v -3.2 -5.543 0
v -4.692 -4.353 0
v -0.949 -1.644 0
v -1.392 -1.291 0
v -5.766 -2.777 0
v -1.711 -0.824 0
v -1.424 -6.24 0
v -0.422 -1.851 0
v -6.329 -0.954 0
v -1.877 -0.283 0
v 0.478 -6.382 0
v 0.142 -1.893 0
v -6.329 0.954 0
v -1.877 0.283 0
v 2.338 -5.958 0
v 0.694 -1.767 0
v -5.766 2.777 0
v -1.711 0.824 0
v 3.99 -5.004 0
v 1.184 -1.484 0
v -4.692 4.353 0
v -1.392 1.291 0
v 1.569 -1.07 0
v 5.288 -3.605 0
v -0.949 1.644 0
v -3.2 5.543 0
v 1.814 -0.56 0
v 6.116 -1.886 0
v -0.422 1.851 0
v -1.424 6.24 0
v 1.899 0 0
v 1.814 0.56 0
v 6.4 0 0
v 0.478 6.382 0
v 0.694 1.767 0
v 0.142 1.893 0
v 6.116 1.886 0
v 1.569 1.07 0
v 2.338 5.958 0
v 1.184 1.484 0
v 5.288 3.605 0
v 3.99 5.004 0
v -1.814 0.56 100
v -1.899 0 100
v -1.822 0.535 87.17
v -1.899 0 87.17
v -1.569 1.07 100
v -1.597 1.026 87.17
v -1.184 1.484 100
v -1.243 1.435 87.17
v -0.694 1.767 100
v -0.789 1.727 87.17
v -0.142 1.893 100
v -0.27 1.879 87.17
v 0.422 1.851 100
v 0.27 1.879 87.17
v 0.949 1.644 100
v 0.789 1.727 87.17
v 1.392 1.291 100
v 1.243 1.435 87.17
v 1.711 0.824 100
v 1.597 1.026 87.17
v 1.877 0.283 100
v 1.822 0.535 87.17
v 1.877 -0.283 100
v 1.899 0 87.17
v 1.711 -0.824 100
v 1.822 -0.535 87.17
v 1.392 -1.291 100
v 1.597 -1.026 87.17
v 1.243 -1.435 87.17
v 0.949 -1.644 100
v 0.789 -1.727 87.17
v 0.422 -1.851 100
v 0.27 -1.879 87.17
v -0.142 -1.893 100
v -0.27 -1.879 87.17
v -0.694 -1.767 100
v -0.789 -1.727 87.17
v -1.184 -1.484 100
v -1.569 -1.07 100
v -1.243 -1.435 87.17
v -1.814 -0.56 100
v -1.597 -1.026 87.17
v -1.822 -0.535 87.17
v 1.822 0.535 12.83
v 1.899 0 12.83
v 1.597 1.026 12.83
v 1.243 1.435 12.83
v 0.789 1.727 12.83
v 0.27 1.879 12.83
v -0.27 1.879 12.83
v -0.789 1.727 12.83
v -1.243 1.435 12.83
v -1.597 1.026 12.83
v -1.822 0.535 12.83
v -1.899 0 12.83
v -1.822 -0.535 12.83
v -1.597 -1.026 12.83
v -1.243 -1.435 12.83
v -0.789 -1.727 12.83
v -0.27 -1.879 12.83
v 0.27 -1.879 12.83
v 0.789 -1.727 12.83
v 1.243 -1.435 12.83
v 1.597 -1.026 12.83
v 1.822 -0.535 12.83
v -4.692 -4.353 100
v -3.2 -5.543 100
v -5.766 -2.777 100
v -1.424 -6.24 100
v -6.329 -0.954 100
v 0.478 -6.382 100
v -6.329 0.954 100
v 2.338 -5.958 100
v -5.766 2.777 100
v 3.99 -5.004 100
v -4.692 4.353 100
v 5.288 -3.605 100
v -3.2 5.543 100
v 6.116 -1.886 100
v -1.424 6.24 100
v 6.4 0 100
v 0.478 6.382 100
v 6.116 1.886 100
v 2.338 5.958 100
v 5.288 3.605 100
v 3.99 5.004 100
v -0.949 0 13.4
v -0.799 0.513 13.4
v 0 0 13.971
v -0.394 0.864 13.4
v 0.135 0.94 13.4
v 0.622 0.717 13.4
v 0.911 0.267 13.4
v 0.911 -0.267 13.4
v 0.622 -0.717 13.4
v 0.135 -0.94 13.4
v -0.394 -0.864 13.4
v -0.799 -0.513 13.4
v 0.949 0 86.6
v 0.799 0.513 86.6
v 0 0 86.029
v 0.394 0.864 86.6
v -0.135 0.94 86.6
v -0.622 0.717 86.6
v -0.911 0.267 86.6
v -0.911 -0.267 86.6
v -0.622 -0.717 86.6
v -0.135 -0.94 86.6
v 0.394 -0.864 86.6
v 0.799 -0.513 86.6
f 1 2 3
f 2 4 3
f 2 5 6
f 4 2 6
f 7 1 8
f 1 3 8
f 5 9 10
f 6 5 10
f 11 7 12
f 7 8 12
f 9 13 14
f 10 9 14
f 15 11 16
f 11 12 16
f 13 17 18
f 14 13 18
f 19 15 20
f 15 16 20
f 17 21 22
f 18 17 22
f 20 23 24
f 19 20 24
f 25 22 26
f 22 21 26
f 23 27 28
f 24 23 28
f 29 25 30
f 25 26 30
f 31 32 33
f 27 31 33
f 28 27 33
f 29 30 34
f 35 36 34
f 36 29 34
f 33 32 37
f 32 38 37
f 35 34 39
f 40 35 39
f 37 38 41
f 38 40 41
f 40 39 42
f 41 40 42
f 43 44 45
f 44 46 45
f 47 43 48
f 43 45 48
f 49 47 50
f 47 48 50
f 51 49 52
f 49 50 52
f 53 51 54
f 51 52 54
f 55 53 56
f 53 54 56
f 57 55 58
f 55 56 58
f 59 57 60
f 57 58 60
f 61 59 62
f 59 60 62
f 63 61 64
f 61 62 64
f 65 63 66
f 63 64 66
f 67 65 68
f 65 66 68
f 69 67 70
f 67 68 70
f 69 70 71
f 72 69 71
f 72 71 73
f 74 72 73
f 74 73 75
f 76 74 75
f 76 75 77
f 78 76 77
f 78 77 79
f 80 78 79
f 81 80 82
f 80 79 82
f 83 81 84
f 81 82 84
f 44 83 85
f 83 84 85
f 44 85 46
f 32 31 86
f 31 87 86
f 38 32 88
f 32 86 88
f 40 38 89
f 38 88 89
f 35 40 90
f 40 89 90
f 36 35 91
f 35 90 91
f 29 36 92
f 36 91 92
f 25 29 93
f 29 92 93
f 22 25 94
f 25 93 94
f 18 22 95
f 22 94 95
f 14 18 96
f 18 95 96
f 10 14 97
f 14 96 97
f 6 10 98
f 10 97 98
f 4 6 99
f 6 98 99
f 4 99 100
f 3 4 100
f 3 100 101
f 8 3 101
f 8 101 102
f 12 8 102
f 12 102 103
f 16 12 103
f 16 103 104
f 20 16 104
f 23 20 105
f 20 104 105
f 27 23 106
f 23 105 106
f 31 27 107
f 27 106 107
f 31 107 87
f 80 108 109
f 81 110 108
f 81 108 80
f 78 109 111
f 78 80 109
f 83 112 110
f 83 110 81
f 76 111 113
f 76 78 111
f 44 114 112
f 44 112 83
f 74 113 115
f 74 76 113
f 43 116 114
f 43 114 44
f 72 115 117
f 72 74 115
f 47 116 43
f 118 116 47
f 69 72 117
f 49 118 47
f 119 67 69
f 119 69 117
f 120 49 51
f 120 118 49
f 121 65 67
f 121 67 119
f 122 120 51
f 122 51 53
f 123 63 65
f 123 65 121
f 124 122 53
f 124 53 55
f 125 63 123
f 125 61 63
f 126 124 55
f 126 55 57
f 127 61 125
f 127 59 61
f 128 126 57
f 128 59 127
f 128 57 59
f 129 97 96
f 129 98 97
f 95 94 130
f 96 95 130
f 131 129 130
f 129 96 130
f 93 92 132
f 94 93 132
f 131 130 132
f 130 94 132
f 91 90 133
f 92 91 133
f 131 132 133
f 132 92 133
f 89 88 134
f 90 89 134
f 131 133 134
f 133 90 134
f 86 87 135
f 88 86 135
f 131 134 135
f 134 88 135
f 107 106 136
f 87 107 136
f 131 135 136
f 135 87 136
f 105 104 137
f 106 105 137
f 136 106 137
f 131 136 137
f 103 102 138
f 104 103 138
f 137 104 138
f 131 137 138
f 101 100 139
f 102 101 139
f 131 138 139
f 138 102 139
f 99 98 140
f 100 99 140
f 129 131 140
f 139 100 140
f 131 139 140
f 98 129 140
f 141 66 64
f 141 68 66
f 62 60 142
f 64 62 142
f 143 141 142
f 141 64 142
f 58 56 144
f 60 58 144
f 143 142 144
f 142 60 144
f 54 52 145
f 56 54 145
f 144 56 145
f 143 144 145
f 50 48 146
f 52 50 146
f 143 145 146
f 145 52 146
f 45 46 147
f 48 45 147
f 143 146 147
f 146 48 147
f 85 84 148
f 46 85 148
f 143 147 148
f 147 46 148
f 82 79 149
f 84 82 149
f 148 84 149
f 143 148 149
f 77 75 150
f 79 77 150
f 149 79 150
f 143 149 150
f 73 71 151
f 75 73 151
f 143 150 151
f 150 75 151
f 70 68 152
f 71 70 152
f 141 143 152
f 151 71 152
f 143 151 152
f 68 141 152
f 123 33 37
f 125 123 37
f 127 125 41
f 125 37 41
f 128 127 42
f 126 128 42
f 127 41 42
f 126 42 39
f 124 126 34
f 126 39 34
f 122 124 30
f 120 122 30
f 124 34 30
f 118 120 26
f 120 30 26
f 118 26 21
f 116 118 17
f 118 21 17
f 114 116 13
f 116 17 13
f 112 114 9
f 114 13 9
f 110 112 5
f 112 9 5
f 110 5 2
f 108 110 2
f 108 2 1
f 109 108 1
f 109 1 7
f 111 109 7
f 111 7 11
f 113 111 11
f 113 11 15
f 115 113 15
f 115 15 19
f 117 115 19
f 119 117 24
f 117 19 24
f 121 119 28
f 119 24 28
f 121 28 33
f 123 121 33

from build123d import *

# Parameters (mm, degrees)
SKETCH1_R                  = 6.4
BOSS_EXTRUDE1_DEPTH        = 100
F_10_24_TAPPED_HOLE1_D     = 3.7973
F_10_24_TAPPED_HOLE1_DEPTH = 12.83
F_10_24_TAPPED_HOLE1_TIP   = 1.140824014
F_10_24_TAPPED_HOLE2_D     = 3.7973
F_10_24_TAPPED_HOLE2_DEPTH = 12.83
F_10_24_TAPPED_HOLE2_TIP   = 1.140824014


with BuildPart() as part:
    # Sketch1 → Boss-Extrude1 (new body)
    with BuildSketch(Plane.XY):
        Circle(SKETCH1_R)
    extrude(amount=BOSS_EXTRUDE1_DEPTH)

    # #10-24 Tapped Hole1
    with Locations(Plane(origin=(0, 0, 0), x_dir=(-1, 0, 0), z_dir=(0, 0, -1))):
        with Locations((0, 0)):
            Hole(F_10_24_TAPPED_HOLE1_D / 2, depth=F_10_24_TAPPED_HOLE1_DEPTH)
            with Locations((0, 0, -(F_10_24_TAPPED_HOLE1_DEPTH + F_10_24_TAPPED_HOLE1_TIP / 2))):  # 118° drill point
                Cone(0, F_10_24_TAPPED_HOLE1_D / 2, F_10_24_TAPPED_HOLE1_TIP, mode=Mode.SUBTRACT)

    # #10-24 Tapped Hole2
    with Locations(Plane.XY.offset(100)):
        with Locations((0, 0)):
            Hole(F_10_24_TAPPED_HOLE2_D / 2, depth=F_10_24_TAPPED_HOLE2_DEPTH)
            with Locations((0, 0, -(F_10_24_TAPPED_HOLE2_DEPTH + F_10_24_TAPPED_HOLE2_TIP / 2))):  # 118° drill point
                Cone(0, F_10_24_TAPPED_HOLE2_D / 2, F_10_24_TAPPED_HOLE2_TIP, mode=Mode.SUBTRACT)


solid = part.part
